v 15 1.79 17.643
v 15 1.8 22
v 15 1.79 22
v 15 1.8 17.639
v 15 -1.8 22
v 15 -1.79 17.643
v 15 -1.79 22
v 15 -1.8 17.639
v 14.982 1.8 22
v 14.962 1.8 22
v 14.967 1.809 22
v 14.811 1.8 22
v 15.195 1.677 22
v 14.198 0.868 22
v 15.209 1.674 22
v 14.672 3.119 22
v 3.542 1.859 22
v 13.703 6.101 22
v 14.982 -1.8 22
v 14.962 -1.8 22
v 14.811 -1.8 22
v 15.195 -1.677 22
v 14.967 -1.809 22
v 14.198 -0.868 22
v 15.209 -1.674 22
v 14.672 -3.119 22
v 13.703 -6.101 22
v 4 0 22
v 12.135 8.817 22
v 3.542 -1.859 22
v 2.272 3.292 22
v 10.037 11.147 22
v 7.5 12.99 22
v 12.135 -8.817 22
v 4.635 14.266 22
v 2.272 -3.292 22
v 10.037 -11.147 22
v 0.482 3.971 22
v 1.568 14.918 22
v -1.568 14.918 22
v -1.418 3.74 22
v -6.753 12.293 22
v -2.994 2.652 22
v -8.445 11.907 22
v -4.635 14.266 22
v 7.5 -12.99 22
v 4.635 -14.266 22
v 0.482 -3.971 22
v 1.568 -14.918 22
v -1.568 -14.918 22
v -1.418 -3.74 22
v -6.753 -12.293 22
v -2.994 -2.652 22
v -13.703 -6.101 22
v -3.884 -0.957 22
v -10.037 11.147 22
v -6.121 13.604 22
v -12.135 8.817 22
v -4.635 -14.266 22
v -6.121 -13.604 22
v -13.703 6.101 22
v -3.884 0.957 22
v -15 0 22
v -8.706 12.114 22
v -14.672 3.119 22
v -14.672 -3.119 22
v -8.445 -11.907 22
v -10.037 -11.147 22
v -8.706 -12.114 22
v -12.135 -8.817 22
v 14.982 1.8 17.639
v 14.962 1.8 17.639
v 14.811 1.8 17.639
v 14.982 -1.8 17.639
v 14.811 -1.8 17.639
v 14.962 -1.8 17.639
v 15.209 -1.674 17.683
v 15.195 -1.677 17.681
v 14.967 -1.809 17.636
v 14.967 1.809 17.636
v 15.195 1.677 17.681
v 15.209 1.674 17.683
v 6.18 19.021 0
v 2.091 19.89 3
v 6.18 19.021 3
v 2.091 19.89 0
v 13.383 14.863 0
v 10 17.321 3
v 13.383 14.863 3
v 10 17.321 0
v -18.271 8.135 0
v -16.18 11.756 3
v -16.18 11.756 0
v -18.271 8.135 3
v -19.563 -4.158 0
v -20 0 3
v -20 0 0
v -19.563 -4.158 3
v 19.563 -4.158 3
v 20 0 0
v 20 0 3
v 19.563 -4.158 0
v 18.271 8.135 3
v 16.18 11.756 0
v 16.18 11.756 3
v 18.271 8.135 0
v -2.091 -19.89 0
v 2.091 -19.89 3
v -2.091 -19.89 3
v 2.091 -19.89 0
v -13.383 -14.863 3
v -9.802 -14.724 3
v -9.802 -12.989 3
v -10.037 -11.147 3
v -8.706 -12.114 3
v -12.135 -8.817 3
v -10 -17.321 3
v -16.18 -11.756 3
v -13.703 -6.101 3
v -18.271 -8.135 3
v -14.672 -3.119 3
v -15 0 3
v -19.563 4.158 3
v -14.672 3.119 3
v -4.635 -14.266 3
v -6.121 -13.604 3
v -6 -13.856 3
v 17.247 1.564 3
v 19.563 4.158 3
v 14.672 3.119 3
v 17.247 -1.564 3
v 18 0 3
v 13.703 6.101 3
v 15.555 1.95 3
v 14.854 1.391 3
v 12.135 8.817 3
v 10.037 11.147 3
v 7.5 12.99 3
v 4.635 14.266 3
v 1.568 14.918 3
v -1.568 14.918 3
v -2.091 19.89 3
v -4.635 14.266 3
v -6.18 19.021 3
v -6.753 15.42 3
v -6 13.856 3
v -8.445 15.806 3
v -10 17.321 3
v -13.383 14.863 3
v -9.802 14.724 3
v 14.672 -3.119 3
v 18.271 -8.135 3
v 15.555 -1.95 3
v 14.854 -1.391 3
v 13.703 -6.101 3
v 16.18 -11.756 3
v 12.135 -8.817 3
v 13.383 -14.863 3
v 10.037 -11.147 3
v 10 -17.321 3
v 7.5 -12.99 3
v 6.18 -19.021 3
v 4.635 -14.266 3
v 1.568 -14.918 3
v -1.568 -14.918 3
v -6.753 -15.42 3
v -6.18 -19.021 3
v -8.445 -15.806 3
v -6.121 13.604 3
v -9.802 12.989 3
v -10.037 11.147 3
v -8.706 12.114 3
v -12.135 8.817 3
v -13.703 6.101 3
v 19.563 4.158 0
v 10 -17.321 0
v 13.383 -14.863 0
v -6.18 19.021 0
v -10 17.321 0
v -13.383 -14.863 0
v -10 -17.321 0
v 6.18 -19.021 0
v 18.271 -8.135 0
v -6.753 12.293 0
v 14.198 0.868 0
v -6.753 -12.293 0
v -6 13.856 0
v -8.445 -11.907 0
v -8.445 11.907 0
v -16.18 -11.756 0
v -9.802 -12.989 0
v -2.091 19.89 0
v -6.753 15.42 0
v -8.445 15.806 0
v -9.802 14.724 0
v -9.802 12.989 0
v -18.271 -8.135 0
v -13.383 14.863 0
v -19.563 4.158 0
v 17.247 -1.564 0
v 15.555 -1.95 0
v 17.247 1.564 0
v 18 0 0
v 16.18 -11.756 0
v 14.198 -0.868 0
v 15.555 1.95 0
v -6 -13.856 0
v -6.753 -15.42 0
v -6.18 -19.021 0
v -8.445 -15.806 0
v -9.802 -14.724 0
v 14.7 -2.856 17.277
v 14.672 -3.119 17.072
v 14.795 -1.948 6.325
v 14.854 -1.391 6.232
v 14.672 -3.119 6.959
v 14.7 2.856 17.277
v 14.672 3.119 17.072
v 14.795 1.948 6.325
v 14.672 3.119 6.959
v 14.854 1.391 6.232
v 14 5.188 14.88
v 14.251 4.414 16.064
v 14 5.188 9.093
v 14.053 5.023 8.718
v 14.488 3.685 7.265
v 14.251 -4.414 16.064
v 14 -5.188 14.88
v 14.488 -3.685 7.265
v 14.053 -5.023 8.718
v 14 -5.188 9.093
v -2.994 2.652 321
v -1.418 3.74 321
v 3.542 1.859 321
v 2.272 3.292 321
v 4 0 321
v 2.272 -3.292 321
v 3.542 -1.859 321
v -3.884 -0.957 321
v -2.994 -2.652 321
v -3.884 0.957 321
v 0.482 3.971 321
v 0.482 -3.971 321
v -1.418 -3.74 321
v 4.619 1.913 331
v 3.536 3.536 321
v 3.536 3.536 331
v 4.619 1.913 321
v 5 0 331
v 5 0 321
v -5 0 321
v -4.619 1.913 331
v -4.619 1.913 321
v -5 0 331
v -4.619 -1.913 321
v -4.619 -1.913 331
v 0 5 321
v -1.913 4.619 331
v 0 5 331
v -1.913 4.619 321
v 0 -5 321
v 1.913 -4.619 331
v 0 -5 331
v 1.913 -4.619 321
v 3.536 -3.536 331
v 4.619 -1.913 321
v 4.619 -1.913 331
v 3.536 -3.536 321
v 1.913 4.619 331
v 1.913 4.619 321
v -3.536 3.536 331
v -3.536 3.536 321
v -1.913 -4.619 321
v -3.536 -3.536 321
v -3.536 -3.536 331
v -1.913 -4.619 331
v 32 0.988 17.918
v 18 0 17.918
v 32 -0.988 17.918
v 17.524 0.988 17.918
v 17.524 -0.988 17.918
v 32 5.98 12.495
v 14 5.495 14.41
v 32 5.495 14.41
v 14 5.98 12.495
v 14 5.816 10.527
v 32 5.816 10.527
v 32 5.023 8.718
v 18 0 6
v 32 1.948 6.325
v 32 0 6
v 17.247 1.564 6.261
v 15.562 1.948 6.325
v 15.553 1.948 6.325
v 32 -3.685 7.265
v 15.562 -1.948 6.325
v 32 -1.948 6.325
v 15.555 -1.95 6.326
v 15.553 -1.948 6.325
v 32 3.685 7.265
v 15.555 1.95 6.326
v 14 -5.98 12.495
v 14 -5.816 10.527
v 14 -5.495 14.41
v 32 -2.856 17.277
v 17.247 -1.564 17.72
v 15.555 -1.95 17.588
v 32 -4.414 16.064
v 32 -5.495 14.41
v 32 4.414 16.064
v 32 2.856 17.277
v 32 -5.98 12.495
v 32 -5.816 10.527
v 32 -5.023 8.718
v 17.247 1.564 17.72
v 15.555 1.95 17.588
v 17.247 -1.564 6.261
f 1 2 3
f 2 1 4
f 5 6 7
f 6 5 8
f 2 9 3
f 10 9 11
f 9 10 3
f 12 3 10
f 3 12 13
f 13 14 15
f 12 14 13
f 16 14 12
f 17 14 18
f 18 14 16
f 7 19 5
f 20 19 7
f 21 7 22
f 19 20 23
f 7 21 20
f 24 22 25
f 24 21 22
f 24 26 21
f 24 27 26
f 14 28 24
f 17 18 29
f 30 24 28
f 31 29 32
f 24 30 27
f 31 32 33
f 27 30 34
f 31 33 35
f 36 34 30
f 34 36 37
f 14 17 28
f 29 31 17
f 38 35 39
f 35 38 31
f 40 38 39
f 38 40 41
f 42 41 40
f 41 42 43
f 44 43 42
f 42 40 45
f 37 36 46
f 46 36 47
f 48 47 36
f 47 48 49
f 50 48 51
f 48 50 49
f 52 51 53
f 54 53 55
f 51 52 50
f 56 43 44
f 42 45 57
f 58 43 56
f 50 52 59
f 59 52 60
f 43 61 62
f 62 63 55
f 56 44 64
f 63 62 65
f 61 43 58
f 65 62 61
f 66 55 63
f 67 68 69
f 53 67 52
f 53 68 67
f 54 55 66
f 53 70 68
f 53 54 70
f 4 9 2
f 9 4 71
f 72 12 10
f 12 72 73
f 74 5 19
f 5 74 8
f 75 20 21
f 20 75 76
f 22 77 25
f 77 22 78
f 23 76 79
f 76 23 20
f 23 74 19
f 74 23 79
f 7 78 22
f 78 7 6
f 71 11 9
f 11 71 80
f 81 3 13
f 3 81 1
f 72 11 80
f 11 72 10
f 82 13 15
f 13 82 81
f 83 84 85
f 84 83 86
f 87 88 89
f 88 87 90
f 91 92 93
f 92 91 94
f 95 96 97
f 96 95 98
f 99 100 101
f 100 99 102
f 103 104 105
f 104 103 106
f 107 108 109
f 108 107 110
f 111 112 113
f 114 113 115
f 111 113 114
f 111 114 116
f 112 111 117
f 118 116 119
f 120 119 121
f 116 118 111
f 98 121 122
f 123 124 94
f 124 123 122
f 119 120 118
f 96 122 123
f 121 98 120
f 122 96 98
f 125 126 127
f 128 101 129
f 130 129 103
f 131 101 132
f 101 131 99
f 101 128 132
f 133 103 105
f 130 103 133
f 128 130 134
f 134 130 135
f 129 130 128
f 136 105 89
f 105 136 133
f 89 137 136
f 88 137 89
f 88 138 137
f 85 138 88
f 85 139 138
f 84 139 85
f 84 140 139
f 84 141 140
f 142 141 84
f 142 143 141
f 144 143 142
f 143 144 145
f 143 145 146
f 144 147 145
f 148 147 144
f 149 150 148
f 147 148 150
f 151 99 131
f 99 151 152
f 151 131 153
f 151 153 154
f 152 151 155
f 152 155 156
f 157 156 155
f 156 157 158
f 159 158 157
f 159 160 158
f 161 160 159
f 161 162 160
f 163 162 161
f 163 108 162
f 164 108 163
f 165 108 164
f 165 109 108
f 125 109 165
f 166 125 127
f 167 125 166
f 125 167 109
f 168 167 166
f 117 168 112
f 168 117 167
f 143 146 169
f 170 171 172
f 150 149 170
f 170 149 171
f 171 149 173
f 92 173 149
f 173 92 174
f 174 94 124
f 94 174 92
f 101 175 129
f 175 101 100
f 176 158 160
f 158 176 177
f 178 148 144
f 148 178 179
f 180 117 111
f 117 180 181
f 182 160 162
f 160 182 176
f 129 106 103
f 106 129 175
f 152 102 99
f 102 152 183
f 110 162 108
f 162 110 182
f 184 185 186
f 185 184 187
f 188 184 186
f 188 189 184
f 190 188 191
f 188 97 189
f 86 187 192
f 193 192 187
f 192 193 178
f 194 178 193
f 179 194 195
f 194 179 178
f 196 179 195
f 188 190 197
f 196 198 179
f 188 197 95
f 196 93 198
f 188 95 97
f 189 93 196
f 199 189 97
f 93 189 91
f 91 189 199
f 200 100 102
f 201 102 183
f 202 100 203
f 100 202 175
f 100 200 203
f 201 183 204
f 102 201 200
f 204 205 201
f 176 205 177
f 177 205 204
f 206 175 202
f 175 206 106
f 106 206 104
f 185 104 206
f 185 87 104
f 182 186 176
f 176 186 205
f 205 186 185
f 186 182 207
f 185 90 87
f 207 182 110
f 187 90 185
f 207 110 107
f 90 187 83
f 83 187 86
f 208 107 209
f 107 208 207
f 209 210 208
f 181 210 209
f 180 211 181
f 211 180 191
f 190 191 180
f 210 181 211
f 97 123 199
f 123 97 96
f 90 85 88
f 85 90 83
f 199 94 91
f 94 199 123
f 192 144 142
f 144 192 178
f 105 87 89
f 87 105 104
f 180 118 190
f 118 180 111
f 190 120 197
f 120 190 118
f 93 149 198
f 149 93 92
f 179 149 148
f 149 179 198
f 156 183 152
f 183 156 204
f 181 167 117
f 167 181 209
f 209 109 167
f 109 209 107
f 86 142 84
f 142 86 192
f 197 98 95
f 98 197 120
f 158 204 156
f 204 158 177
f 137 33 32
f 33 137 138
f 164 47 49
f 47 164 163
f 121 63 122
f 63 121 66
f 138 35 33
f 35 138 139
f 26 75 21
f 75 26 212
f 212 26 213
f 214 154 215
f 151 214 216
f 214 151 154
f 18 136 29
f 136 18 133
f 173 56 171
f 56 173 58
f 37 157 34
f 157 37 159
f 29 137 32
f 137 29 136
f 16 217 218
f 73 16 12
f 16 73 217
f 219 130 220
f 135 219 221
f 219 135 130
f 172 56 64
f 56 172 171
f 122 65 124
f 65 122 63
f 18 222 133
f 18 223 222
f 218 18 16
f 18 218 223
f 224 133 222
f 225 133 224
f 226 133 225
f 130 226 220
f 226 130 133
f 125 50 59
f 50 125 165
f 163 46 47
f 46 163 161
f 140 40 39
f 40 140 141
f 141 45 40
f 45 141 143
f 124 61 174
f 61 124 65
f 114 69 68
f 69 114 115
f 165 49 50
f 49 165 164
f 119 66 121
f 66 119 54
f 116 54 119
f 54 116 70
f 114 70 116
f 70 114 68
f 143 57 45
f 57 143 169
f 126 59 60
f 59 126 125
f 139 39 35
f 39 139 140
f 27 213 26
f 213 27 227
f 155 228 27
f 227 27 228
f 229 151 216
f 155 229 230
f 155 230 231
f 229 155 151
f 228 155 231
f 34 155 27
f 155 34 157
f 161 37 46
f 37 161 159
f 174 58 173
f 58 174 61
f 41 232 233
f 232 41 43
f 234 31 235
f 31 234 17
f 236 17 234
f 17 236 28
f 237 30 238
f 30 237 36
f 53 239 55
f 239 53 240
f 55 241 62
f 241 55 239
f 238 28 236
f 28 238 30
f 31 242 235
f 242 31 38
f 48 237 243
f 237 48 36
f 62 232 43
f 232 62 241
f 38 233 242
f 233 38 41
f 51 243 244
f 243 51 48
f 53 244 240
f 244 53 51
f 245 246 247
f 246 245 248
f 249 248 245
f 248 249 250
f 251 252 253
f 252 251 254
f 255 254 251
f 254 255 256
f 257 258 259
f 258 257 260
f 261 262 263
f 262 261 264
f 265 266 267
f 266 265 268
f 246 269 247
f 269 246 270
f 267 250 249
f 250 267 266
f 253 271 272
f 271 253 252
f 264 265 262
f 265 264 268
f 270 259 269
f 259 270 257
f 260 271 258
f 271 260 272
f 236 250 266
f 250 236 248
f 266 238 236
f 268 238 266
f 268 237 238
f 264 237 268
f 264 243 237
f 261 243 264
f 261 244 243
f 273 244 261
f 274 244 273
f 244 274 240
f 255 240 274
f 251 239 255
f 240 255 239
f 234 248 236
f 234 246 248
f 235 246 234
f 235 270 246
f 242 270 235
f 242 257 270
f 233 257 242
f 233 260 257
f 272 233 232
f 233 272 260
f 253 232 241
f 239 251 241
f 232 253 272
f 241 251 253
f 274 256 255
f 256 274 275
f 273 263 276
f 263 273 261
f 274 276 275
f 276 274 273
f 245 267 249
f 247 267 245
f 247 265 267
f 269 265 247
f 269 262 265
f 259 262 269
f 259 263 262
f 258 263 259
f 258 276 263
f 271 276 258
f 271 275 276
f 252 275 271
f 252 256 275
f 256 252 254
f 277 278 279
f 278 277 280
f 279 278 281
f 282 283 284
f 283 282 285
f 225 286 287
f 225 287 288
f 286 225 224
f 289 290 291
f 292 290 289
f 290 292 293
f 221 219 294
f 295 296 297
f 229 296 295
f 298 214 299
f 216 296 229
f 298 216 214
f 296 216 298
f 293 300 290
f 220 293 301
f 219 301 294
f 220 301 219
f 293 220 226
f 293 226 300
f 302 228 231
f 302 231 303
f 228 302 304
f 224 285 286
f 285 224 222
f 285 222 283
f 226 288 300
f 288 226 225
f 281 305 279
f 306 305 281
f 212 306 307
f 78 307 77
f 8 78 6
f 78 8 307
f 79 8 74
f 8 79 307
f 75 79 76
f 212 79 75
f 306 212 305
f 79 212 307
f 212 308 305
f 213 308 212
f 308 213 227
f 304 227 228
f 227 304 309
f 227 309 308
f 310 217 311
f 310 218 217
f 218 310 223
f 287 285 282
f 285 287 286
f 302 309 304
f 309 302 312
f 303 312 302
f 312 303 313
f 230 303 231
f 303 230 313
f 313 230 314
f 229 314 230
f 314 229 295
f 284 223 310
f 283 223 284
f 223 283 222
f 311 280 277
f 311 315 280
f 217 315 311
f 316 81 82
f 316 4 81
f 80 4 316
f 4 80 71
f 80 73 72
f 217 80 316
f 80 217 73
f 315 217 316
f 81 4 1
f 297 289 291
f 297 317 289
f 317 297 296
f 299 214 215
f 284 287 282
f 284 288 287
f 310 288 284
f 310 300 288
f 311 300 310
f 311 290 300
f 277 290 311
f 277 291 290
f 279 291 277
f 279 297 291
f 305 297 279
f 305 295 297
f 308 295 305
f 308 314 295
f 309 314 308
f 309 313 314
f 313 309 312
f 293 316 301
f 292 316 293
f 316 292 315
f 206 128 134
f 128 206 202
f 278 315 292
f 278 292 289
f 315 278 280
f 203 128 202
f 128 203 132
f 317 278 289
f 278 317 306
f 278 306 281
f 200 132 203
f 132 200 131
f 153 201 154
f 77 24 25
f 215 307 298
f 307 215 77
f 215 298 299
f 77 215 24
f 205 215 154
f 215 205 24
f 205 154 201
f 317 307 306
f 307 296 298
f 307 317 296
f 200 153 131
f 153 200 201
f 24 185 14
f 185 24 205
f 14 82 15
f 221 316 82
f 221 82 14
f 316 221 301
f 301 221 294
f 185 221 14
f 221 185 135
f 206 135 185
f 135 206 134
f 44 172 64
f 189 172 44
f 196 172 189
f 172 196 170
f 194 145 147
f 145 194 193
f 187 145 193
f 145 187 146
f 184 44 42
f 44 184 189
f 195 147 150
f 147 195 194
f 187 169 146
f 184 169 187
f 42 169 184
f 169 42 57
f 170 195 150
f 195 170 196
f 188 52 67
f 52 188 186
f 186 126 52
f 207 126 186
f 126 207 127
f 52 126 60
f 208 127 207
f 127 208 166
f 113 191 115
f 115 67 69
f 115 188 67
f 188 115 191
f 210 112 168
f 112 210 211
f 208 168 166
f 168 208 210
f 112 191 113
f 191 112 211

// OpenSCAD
// Parameters
mast_height = 300; //[150:600:1]
mast_diameter = 8; //[4:16:1]
base_height = 20; //[10:40:1]
base_diameter = 30; //[15:60:1]
flange_thickness = 3; //[2:8:1]
flange_diameter = 40; //[20:80:1]
hole_count = 3; //[2:8:1]
hole_diameter = 4; //[2:10:1]
hole_circle_diameter = 32; //[16:64:1]
overlap = 1; //[0.5:2:0.5]
tip_cap_height = 10; //[5:25:1]
tip_cap_diameter = 10; //[6:20:1]
connector_diameter = 12; //[6:24:1]
connector_length = 18; //[8:40:1]
connector_offset_y = 0; //[-10:10:1]
knurl_tooth_count = 24; //[12:60:1]
knurl_tooth_depth = 1; //[0.5:2:0.5]
knurl_band_height = 10; //[5:20:1]

// Base shapes
module mast_cyl() {
  translate([0, 0, base_height + flange_thickness - overlap + mast_height / 2])
    cylinder(h = mast_height, r = mast_diameter / 2, center = true);
}

module base_mount_cyl() {
  translate([0, 0, flange_thickness + base_height / 2 - overlap])
    cylinder(h = base_height, r = base_diameter / 2, center = true);
}

module base_flange_cyl() {
  translate([0, 0, flange_thickness / 2])
    cylinder(h = flange_thickness, r = flange_diameter / 2, center = true);
}

module tip_cap_cyl() {
  translate([0, 0, base_height + flange_thickness - overlap + mast_height + tip_cap_height / 2 - overlap])
    cylinder(h = tip_cap_height, r = tip_cap_diameter / 2, center = true);
}

module connector_cyl() {
  translate([base_diameter / 2 + connector_length / 2 - overlap, connector_offset_y, flange_thickness + base_height / 2 - overlap])
    rotate([0, 90, 0])
    cylinder(h = connector_length, r = connector_diameter / 2, center = true);
}

module knurl_tooth_box(angle) {
  translate([base_diameter / 2 + knurl_tooth_depth / 2 - overlap, 0, flange_thickness + base_height - knurl_band_height / 2 - overlap])
    rotate([0, 0, angle])
    cube([knurl_tooth_depth, base_diameter * 0.12, knurl_band_height], center = true);
}

module mount_hole_cyl(angle) {
  translate([hole_circle_diameter / 2 * cos(angle), hole_circle_diameter / 2 * sin(angle), (flange_thickness + base_height) / 2])
    cylinder(h = flange_thickness + base_height + overlap * 2, r = hole_diameter / 2, center = true);
}

// Operations
module antenna_solid_union() {
  union() {
    base_flange_cyl();
    base_mount_cyl();
    mast_cyl();
    tip_cap_cyl();
    connector_cyl();
    for (i = [0:knurl_tooth_count-1]) {
      knurl_tooth_box(i * 360 / knurl_tooth_count);
    }
  }
}

module antenna_with_mounting_holes() {
  difference() {
    antenna_solid_union();
    for (i = [0:hole_count-1]) {
      mount_hole_cyl(i * 360 / hole_count);
    }
  }
}

// Final output
color("Silver") antenna_with_mounting_holes();
